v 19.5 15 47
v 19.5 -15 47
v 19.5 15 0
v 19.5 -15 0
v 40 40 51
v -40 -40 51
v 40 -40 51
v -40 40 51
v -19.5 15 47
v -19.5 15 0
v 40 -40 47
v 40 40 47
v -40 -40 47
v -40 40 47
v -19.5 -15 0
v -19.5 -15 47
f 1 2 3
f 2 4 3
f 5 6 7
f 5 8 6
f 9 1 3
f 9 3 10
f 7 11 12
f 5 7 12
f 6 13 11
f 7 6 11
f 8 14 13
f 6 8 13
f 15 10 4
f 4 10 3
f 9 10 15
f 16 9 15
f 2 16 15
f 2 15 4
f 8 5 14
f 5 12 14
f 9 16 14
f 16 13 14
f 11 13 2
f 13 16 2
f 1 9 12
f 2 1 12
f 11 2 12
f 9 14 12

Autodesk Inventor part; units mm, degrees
ref_plane "YZ Plane" through (0, 0, 0) normal (1, 0, 0) x (0, 1, 0)
ref_plane "XZ Plane" through (0, 0, 0) normal (0, 1, 0) x (-1, 0, 0)
ref_plane "XY Plane" through (0, 0, 0) normal (0, 0, 1) x (1, 0, 0)
sketch "Skizze1" plane through (0, 0, 0) normal (0, 0, 1) x (1, 0, 0)
  line L0 (-19.5, -15) -> (19.5, -15)
  line L1 (19.5, -15) -> (19.5, 15)
  line L2 (19.5, 15) -> (-19.5, 15)
  line L3 (-19.5, 15) -> (-19.5, -15)
  line L4 (-19.5, -15) -> (19.5, 15) construction
  line L5 (19.5, -15) -> (-19.5, 15) construction
  point P0 (0, 0)
  point P1 (0, 0)
  point P2 (0, 0)
  dimension "d8" = 39
  dimension "d9" = 30
extrude "Extrusion1" add sketch "Skizze1" along normal blind 47
sketch "Skizze2" plane through (0, 0, 47) normal (0, 0, 1) x (1, 0, 0)
  line L0 (-40, -40) -> (40, -40)
  line L1 (40, -40) -> (40, 40)
  line L2 (40, 40) -> (-40, 40)
  line L3 (-40, 40) -> (-40, -40)
  point P0 (0, 0)
  point P1 (0, 40)
  point P2 (-40, 0)
  dimension "d4" = 80
extrude "Extrusion2" add sketch "Skizze2" along normal blind 4
properties part number "Beacon-Support"
